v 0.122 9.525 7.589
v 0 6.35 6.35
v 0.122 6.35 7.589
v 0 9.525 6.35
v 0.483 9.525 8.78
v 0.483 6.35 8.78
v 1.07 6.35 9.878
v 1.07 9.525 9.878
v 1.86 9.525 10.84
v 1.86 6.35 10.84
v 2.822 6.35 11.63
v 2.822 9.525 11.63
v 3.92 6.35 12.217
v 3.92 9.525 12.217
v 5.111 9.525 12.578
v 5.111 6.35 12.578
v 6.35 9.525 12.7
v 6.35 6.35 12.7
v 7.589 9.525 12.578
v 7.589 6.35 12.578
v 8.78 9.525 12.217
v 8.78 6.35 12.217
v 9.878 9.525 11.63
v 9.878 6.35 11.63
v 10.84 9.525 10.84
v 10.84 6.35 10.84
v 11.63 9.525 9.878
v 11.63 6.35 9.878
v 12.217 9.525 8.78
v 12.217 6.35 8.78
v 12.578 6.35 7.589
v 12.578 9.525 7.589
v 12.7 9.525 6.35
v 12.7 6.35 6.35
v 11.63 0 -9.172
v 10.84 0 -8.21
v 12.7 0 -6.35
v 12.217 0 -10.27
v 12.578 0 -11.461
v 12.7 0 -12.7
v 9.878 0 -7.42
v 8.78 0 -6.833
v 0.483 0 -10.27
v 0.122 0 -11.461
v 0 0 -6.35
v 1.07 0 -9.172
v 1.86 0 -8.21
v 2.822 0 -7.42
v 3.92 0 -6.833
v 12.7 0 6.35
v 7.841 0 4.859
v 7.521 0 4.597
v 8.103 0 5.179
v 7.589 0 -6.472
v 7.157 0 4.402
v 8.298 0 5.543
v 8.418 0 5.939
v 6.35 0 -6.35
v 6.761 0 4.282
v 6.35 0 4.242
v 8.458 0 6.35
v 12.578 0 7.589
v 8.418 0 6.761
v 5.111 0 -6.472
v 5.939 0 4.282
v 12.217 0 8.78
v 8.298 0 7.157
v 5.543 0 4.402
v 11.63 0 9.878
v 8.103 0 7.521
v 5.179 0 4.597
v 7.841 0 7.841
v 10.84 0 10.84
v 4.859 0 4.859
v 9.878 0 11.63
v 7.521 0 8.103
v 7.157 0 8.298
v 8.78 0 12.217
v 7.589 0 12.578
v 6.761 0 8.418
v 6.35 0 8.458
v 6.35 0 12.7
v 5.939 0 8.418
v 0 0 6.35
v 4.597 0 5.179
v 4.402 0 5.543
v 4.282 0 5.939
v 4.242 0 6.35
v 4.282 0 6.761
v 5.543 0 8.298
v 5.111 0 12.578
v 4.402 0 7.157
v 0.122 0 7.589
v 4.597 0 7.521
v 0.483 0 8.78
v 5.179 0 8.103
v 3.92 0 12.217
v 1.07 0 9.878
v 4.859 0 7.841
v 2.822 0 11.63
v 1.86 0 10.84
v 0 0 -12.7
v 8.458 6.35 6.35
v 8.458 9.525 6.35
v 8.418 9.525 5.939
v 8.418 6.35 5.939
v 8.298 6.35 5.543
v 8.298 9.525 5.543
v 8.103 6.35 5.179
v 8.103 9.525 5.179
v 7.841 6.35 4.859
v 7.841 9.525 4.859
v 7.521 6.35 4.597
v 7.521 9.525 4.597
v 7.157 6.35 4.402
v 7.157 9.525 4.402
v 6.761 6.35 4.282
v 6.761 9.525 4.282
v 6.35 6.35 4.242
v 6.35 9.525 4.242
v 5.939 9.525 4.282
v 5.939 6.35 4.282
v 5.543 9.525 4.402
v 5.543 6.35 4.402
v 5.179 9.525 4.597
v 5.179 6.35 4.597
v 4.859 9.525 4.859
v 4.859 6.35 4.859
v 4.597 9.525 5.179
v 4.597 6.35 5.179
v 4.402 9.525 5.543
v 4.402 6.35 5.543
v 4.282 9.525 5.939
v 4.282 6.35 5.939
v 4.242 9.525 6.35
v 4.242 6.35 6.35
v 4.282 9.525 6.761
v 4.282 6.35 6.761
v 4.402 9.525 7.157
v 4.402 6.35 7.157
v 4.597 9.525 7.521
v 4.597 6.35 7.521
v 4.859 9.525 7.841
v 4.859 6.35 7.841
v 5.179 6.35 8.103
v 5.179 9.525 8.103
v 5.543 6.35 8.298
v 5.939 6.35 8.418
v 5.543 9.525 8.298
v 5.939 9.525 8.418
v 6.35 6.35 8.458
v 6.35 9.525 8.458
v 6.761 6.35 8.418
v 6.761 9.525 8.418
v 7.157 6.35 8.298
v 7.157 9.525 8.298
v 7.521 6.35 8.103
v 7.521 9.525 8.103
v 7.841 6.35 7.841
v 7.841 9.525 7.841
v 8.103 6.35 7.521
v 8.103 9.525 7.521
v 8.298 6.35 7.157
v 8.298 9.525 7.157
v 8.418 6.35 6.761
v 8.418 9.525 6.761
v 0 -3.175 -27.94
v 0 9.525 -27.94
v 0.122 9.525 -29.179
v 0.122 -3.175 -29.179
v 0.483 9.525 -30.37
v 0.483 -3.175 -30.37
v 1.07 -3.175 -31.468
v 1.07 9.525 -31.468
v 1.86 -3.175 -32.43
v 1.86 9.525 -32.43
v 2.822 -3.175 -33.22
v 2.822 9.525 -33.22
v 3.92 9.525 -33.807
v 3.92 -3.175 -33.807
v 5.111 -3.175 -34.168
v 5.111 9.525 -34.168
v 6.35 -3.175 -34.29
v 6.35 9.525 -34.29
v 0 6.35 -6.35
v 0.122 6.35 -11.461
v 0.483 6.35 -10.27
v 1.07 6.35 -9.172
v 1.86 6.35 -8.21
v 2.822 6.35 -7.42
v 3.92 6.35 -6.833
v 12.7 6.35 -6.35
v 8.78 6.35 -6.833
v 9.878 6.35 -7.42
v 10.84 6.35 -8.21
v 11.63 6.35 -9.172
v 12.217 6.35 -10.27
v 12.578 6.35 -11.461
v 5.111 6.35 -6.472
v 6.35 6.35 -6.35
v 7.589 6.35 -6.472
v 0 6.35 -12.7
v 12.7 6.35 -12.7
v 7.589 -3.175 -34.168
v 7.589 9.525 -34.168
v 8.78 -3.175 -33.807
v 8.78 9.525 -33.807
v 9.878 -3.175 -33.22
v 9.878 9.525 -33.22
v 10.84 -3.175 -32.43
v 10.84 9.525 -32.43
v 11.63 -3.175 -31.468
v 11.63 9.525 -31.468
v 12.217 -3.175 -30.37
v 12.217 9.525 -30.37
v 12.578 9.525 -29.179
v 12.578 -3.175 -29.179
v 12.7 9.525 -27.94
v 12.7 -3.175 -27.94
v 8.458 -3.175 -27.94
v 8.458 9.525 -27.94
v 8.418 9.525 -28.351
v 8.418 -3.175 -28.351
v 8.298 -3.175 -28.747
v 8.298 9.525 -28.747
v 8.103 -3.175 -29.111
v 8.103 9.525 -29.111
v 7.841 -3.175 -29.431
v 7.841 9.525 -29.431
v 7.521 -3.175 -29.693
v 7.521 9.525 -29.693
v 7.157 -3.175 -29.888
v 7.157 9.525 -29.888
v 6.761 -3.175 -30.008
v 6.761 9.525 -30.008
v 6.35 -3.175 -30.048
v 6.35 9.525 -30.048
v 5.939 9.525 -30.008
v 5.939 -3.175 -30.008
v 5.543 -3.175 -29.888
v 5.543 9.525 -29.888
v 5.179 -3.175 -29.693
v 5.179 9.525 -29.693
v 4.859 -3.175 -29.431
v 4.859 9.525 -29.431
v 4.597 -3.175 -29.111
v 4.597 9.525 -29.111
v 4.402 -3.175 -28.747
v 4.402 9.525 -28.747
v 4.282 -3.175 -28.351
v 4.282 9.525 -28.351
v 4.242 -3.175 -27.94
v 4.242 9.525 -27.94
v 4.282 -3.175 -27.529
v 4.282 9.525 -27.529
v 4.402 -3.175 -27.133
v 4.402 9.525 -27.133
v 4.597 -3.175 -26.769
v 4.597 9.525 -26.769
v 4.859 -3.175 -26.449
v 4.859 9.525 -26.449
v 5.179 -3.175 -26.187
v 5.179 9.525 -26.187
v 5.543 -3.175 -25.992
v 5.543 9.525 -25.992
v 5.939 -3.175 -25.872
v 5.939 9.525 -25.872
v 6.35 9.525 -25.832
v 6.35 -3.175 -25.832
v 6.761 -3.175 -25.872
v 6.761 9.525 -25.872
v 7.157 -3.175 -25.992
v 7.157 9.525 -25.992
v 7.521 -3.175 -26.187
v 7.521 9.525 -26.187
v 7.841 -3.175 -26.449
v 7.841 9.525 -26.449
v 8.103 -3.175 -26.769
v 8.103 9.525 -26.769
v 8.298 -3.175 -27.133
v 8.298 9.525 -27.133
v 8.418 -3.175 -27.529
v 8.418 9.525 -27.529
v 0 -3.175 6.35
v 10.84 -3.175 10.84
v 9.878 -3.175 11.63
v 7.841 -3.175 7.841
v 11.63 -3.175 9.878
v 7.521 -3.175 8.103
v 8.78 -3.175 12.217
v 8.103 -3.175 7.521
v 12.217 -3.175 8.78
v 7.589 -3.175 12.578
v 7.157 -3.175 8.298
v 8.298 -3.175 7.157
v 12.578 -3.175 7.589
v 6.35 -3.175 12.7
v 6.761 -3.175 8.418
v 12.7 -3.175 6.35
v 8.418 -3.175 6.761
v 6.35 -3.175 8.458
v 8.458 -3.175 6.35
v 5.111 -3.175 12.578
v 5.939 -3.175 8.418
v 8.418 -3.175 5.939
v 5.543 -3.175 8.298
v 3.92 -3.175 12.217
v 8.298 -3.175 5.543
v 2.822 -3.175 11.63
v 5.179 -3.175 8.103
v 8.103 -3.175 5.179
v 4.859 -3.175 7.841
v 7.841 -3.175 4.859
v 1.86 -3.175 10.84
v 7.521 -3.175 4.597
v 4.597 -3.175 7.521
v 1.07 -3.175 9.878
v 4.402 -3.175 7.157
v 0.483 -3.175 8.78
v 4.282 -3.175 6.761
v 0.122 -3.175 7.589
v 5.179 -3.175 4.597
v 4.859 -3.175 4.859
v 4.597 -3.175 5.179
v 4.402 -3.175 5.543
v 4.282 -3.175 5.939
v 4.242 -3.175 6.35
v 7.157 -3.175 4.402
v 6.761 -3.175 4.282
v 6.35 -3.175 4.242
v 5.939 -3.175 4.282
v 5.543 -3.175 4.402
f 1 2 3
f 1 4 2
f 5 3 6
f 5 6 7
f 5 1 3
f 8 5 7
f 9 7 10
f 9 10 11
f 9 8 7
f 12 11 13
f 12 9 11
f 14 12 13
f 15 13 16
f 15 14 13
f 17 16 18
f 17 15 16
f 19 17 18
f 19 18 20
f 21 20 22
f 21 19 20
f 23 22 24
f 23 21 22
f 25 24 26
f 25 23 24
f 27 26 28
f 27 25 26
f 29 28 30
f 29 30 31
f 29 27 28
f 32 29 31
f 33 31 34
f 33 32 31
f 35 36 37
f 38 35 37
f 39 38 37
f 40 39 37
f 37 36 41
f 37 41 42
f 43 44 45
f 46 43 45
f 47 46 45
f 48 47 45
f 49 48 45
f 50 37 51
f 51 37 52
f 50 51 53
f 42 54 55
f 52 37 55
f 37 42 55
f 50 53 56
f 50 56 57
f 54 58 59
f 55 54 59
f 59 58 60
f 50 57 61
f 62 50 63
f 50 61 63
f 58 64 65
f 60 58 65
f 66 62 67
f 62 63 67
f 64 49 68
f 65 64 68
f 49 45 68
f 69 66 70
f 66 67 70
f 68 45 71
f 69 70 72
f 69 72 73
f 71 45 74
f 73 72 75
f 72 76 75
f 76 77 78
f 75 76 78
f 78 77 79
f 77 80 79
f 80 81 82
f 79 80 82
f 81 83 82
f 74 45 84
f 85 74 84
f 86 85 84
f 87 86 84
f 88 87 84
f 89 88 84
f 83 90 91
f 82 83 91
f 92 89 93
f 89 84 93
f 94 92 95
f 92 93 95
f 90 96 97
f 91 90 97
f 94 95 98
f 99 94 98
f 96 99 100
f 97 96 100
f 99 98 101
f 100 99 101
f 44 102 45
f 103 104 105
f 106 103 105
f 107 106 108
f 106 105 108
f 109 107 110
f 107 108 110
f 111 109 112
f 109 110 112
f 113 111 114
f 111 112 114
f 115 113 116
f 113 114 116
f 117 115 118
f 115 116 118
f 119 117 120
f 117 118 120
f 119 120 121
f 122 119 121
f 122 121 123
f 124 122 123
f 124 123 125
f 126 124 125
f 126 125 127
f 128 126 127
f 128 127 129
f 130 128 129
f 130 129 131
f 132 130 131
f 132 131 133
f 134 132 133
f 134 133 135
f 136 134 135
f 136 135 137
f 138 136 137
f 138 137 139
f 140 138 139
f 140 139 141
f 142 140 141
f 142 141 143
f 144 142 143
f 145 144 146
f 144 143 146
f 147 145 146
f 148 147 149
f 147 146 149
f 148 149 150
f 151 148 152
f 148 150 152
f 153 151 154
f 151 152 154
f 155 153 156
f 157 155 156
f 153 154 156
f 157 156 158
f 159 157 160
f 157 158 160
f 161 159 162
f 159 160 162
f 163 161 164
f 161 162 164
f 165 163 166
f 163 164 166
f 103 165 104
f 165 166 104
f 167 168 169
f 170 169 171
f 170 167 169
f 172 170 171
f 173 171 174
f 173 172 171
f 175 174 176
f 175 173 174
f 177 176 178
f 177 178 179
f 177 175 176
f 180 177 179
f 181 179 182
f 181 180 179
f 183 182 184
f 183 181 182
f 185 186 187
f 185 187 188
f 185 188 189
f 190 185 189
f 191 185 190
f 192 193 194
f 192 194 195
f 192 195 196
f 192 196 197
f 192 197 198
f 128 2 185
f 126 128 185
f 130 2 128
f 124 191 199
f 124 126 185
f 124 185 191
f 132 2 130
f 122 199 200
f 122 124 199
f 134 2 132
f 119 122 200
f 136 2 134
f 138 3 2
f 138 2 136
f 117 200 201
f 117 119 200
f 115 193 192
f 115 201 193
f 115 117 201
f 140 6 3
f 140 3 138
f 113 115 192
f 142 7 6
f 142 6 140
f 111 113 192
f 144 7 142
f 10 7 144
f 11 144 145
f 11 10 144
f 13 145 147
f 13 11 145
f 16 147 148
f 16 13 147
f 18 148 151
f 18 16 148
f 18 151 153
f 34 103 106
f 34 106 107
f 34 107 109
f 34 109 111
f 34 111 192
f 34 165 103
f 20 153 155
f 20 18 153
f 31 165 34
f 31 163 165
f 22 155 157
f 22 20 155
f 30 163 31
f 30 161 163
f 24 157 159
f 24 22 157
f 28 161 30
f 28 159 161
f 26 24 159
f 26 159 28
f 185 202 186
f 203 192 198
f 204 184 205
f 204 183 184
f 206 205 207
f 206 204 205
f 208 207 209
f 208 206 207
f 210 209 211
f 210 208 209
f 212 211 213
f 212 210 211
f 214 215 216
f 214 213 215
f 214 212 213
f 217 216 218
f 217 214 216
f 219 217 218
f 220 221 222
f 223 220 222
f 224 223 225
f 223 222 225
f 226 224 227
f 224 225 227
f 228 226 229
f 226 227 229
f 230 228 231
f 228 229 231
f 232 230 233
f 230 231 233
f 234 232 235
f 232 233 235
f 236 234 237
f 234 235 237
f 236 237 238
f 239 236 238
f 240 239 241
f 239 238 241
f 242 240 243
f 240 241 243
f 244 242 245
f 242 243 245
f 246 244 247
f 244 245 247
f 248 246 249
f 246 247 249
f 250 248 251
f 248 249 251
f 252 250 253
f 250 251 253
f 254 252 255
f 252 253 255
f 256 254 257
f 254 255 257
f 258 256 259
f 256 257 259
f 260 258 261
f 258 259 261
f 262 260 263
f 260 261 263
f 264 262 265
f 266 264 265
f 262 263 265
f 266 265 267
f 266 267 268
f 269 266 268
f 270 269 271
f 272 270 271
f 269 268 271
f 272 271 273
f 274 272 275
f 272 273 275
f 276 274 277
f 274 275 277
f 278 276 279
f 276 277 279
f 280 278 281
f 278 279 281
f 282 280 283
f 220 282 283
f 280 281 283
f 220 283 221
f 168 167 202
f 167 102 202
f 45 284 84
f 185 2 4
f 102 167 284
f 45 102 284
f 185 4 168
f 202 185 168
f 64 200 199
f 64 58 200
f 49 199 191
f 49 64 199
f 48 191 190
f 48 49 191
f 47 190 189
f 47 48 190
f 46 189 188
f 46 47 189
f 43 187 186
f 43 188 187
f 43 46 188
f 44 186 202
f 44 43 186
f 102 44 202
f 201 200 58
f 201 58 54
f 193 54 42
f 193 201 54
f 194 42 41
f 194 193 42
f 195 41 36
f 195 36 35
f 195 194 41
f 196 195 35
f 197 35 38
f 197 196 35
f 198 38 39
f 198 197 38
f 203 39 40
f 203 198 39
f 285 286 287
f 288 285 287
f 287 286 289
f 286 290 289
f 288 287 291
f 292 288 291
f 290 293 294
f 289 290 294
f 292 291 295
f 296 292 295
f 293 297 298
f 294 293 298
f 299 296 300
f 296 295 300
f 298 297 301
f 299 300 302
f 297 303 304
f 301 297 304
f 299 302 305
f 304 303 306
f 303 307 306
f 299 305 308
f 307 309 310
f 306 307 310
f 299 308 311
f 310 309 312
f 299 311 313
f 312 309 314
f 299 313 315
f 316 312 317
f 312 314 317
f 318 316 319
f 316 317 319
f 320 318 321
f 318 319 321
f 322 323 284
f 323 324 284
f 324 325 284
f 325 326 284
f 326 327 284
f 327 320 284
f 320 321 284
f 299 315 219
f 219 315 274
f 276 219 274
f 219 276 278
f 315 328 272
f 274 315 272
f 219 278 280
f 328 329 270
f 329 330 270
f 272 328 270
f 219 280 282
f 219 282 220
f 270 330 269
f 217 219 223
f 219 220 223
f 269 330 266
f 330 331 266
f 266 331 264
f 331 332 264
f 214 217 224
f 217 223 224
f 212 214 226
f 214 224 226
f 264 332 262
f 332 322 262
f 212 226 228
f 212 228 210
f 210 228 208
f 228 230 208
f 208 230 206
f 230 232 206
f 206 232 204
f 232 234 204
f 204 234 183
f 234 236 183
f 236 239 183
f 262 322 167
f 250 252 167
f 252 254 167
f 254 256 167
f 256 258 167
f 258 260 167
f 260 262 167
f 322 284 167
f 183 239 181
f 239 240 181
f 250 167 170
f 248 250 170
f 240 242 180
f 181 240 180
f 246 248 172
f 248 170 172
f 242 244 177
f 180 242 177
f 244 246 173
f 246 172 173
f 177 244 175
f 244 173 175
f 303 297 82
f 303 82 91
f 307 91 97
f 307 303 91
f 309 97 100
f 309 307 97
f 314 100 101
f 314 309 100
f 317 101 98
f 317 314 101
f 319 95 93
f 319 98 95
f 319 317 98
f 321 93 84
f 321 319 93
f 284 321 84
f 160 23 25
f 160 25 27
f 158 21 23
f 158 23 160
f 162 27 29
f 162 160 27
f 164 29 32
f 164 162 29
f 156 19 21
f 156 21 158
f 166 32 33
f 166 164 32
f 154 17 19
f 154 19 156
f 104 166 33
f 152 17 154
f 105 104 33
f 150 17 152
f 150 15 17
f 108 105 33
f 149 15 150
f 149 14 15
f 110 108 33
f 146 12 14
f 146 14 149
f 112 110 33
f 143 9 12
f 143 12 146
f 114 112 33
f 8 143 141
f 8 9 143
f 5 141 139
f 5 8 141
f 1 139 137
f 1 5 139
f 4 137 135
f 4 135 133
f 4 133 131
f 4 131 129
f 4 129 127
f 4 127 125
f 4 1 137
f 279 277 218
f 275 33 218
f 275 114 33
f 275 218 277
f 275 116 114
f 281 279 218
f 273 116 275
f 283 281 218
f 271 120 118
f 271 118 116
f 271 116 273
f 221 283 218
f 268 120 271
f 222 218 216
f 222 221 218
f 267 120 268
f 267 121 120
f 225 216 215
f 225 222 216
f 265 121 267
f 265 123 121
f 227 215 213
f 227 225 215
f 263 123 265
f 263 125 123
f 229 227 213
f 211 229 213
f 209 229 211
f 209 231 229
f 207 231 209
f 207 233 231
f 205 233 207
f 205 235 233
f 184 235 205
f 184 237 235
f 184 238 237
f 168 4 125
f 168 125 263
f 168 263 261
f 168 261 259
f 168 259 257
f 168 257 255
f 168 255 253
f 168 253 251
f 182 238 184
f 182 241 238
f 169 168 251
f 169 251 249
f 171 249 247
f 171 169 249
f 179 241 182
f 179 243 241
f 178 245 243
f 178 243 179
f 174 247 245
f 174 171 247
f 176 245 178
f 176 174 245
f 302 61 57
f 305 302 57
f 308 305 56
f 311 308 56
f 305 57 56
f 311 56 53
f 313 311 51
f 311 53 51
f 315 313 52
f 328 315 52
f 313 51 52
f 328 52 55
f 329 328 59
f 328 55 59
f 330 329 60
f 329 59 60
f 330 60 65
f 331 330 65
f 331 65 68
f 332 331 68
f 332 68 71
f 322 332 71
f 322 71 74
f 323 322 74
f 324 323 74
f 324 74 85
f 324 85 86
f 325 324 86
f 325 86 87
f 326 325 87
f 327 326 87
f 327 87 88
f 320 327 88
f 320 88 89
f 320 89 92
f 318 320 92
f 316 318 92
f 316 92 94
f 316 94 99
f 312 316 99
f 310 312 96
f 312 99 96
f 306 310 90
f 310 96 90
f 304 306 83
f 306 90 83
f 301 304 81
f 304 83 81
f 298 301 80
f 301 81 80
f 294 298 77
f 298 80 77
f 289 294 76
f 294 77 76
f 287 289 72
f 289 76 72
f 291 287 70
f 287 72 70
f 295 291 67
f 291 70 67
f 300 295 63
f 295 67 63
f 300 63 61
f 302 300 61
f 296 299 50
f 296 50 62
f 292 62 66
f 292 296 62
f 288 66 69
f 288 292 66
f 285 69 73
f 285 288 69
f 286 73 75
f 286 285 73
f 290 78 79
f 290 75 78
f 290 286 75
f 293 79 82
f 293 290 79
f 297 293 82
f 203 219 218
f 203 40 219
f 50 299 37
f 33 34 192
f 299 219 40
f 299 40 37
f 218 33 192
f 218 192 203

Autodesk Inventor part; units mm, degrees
ref_plane "YZ Plane" through (0, 0, 0) normal (1, 0, 0) x (0, 1, 0)
ref_plane "XZ Plane" through (0, 0, 0) normal (0, 1, 0) x (-1, 0, 0)
ref_plane "XY Plane" through (0, 0, 0) normal (0, 0, 1) x (1, 0, 0)
sketch "Sketch1" plane through (0, 0, 0) normal (1, 0, 0) x (0, 1, 0)
  line L0 (0, 0) -> (6.35, 0)
  line L1 (6.35, 0) -> (6.35, 12.7)
  line L2 (0, 0) -> (0, 12.7)
  line L3 (0, 12.7) -> (-3.175, 12.7)
  line L4 (-3.175, 12.7) -> (-3.175, -34.29)
  line L5 (6.35, 12.7) -> (9.525, 12.7)
  line L6 (9.525, 12.7) -> (9.525, -34.29)
  line L7 (9.525, -34.29) -> (-3.175, -34.29)
  dimension "d0" = 6.35
  dimension "d1" = 12.7
  dimension "d2" = 3.175
  dimension "d3" = 46.99
  dimension "d4" = 3.175
extrude "Extrusion1" add sketch "Sketch1" along normal blind 12.7
sketch "Sketch2" plane through (0, 9.525, 12.7) normal (0, 1, 0) x (1, 0, 0)
  line L0 (12.7, 0) -> (12.7, 46.99) projected
  line L1 (0, 12.7) -> (12.7, 0)
  circle A0 centre (6.35, 6.35) radius 2.1082
  dimension "d7" = 4.2164
extrude "Extrusion2" cut sketch "Sketch2" against normal blind 41.275
sketch "Sketch3" plane through (0, 9.525, 12.7) normal (0, 1, 0) x (1, 0, 0)
  line L0 (12.7, 0) -> (12.7, 46.99) projected
  line L1 (12.7, 46.99) -> (12.7, 34.29)
  line L2 (0, 0) -> (0, 46.99) projected
  line L3 (12.7, 34.29) -> (0, 46.99)
  circle A0 centre (6.35, 40.64) radius 2.1082
  point P0 (0, 12.7)
  dimension "d10" = 12.7
  dimension "d11" = 4.2164
extrude "Extrusion3" cut sketch "Sketch3" against normal blind 33.3375
fillet "Fillet5" radius 6.35 2 edges at (0, 3.175, -34.29) (12.7, 3.175, -34.29)
sketch "Sketch6" plane through (0, 0, 0) normal (0, 0, 1) x (1, 0, 0)
  line L0 (0, 0) -> (12.7, 0) projected
  line L1 (0, 6.35) -> (12.7, 6.35) projected
  line L2 (0, 0) -> (12.7, 0)
  line L3 (12.7, 0) -> (12.7, 6.35)
  line L4 (12.7, 6.35) -> (0, 6.35)
  line L5 (0, 6.35) -> (0, 0)
extrude "Extrusion6" cut sketch "Sketch6" against normal blind 6.35
fillet "Fillet6" radius 6.35 6 edges at (0, 7.9375, 12.7) (0, -1.5875, 12.7) (0, 3.175, -6.35) (12.7, 7.9375, 12.7) (12.7, -1.5875, 12.7) (12.7, 3.175, -6.35)
properties part number "wing bar v2"
